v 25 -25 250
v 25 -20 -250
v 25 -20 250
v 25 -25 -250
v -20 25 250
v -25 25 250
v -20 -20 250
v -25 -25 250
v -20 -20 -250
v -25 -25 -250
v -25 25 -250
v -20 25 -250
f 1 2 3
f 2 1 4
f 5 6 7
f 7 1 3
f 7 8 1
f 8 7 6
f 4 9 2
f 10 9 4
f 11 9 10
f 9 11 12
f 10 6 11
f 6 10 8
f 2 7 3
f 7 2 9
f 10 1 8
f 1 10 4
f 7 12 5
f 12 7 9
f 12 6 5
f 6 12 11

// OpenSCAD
module angle_beam(L, w, t, centre = true) {
    R_offset_centre = [-w / 2, -w / 2, -L / 2];
    translate(centre ? R_offset_centre : [0, 0, 0]) union() {
        cube([w, t, L], center = false);
        cube([t, w, L], center = false);
    }
    // Shopping
    echo(str("Rectangular Aluminium angle beam: Rectangular Aluminium angle beam ", L, "mm x ", w, "mm x ", t, "mm - x1"));
    // https://www.metals4u.co.uk/materials/aluminium/aluminium-angle/aa25-4x25-4x4-8-p
}

angle_beam(500, 50, 5);
